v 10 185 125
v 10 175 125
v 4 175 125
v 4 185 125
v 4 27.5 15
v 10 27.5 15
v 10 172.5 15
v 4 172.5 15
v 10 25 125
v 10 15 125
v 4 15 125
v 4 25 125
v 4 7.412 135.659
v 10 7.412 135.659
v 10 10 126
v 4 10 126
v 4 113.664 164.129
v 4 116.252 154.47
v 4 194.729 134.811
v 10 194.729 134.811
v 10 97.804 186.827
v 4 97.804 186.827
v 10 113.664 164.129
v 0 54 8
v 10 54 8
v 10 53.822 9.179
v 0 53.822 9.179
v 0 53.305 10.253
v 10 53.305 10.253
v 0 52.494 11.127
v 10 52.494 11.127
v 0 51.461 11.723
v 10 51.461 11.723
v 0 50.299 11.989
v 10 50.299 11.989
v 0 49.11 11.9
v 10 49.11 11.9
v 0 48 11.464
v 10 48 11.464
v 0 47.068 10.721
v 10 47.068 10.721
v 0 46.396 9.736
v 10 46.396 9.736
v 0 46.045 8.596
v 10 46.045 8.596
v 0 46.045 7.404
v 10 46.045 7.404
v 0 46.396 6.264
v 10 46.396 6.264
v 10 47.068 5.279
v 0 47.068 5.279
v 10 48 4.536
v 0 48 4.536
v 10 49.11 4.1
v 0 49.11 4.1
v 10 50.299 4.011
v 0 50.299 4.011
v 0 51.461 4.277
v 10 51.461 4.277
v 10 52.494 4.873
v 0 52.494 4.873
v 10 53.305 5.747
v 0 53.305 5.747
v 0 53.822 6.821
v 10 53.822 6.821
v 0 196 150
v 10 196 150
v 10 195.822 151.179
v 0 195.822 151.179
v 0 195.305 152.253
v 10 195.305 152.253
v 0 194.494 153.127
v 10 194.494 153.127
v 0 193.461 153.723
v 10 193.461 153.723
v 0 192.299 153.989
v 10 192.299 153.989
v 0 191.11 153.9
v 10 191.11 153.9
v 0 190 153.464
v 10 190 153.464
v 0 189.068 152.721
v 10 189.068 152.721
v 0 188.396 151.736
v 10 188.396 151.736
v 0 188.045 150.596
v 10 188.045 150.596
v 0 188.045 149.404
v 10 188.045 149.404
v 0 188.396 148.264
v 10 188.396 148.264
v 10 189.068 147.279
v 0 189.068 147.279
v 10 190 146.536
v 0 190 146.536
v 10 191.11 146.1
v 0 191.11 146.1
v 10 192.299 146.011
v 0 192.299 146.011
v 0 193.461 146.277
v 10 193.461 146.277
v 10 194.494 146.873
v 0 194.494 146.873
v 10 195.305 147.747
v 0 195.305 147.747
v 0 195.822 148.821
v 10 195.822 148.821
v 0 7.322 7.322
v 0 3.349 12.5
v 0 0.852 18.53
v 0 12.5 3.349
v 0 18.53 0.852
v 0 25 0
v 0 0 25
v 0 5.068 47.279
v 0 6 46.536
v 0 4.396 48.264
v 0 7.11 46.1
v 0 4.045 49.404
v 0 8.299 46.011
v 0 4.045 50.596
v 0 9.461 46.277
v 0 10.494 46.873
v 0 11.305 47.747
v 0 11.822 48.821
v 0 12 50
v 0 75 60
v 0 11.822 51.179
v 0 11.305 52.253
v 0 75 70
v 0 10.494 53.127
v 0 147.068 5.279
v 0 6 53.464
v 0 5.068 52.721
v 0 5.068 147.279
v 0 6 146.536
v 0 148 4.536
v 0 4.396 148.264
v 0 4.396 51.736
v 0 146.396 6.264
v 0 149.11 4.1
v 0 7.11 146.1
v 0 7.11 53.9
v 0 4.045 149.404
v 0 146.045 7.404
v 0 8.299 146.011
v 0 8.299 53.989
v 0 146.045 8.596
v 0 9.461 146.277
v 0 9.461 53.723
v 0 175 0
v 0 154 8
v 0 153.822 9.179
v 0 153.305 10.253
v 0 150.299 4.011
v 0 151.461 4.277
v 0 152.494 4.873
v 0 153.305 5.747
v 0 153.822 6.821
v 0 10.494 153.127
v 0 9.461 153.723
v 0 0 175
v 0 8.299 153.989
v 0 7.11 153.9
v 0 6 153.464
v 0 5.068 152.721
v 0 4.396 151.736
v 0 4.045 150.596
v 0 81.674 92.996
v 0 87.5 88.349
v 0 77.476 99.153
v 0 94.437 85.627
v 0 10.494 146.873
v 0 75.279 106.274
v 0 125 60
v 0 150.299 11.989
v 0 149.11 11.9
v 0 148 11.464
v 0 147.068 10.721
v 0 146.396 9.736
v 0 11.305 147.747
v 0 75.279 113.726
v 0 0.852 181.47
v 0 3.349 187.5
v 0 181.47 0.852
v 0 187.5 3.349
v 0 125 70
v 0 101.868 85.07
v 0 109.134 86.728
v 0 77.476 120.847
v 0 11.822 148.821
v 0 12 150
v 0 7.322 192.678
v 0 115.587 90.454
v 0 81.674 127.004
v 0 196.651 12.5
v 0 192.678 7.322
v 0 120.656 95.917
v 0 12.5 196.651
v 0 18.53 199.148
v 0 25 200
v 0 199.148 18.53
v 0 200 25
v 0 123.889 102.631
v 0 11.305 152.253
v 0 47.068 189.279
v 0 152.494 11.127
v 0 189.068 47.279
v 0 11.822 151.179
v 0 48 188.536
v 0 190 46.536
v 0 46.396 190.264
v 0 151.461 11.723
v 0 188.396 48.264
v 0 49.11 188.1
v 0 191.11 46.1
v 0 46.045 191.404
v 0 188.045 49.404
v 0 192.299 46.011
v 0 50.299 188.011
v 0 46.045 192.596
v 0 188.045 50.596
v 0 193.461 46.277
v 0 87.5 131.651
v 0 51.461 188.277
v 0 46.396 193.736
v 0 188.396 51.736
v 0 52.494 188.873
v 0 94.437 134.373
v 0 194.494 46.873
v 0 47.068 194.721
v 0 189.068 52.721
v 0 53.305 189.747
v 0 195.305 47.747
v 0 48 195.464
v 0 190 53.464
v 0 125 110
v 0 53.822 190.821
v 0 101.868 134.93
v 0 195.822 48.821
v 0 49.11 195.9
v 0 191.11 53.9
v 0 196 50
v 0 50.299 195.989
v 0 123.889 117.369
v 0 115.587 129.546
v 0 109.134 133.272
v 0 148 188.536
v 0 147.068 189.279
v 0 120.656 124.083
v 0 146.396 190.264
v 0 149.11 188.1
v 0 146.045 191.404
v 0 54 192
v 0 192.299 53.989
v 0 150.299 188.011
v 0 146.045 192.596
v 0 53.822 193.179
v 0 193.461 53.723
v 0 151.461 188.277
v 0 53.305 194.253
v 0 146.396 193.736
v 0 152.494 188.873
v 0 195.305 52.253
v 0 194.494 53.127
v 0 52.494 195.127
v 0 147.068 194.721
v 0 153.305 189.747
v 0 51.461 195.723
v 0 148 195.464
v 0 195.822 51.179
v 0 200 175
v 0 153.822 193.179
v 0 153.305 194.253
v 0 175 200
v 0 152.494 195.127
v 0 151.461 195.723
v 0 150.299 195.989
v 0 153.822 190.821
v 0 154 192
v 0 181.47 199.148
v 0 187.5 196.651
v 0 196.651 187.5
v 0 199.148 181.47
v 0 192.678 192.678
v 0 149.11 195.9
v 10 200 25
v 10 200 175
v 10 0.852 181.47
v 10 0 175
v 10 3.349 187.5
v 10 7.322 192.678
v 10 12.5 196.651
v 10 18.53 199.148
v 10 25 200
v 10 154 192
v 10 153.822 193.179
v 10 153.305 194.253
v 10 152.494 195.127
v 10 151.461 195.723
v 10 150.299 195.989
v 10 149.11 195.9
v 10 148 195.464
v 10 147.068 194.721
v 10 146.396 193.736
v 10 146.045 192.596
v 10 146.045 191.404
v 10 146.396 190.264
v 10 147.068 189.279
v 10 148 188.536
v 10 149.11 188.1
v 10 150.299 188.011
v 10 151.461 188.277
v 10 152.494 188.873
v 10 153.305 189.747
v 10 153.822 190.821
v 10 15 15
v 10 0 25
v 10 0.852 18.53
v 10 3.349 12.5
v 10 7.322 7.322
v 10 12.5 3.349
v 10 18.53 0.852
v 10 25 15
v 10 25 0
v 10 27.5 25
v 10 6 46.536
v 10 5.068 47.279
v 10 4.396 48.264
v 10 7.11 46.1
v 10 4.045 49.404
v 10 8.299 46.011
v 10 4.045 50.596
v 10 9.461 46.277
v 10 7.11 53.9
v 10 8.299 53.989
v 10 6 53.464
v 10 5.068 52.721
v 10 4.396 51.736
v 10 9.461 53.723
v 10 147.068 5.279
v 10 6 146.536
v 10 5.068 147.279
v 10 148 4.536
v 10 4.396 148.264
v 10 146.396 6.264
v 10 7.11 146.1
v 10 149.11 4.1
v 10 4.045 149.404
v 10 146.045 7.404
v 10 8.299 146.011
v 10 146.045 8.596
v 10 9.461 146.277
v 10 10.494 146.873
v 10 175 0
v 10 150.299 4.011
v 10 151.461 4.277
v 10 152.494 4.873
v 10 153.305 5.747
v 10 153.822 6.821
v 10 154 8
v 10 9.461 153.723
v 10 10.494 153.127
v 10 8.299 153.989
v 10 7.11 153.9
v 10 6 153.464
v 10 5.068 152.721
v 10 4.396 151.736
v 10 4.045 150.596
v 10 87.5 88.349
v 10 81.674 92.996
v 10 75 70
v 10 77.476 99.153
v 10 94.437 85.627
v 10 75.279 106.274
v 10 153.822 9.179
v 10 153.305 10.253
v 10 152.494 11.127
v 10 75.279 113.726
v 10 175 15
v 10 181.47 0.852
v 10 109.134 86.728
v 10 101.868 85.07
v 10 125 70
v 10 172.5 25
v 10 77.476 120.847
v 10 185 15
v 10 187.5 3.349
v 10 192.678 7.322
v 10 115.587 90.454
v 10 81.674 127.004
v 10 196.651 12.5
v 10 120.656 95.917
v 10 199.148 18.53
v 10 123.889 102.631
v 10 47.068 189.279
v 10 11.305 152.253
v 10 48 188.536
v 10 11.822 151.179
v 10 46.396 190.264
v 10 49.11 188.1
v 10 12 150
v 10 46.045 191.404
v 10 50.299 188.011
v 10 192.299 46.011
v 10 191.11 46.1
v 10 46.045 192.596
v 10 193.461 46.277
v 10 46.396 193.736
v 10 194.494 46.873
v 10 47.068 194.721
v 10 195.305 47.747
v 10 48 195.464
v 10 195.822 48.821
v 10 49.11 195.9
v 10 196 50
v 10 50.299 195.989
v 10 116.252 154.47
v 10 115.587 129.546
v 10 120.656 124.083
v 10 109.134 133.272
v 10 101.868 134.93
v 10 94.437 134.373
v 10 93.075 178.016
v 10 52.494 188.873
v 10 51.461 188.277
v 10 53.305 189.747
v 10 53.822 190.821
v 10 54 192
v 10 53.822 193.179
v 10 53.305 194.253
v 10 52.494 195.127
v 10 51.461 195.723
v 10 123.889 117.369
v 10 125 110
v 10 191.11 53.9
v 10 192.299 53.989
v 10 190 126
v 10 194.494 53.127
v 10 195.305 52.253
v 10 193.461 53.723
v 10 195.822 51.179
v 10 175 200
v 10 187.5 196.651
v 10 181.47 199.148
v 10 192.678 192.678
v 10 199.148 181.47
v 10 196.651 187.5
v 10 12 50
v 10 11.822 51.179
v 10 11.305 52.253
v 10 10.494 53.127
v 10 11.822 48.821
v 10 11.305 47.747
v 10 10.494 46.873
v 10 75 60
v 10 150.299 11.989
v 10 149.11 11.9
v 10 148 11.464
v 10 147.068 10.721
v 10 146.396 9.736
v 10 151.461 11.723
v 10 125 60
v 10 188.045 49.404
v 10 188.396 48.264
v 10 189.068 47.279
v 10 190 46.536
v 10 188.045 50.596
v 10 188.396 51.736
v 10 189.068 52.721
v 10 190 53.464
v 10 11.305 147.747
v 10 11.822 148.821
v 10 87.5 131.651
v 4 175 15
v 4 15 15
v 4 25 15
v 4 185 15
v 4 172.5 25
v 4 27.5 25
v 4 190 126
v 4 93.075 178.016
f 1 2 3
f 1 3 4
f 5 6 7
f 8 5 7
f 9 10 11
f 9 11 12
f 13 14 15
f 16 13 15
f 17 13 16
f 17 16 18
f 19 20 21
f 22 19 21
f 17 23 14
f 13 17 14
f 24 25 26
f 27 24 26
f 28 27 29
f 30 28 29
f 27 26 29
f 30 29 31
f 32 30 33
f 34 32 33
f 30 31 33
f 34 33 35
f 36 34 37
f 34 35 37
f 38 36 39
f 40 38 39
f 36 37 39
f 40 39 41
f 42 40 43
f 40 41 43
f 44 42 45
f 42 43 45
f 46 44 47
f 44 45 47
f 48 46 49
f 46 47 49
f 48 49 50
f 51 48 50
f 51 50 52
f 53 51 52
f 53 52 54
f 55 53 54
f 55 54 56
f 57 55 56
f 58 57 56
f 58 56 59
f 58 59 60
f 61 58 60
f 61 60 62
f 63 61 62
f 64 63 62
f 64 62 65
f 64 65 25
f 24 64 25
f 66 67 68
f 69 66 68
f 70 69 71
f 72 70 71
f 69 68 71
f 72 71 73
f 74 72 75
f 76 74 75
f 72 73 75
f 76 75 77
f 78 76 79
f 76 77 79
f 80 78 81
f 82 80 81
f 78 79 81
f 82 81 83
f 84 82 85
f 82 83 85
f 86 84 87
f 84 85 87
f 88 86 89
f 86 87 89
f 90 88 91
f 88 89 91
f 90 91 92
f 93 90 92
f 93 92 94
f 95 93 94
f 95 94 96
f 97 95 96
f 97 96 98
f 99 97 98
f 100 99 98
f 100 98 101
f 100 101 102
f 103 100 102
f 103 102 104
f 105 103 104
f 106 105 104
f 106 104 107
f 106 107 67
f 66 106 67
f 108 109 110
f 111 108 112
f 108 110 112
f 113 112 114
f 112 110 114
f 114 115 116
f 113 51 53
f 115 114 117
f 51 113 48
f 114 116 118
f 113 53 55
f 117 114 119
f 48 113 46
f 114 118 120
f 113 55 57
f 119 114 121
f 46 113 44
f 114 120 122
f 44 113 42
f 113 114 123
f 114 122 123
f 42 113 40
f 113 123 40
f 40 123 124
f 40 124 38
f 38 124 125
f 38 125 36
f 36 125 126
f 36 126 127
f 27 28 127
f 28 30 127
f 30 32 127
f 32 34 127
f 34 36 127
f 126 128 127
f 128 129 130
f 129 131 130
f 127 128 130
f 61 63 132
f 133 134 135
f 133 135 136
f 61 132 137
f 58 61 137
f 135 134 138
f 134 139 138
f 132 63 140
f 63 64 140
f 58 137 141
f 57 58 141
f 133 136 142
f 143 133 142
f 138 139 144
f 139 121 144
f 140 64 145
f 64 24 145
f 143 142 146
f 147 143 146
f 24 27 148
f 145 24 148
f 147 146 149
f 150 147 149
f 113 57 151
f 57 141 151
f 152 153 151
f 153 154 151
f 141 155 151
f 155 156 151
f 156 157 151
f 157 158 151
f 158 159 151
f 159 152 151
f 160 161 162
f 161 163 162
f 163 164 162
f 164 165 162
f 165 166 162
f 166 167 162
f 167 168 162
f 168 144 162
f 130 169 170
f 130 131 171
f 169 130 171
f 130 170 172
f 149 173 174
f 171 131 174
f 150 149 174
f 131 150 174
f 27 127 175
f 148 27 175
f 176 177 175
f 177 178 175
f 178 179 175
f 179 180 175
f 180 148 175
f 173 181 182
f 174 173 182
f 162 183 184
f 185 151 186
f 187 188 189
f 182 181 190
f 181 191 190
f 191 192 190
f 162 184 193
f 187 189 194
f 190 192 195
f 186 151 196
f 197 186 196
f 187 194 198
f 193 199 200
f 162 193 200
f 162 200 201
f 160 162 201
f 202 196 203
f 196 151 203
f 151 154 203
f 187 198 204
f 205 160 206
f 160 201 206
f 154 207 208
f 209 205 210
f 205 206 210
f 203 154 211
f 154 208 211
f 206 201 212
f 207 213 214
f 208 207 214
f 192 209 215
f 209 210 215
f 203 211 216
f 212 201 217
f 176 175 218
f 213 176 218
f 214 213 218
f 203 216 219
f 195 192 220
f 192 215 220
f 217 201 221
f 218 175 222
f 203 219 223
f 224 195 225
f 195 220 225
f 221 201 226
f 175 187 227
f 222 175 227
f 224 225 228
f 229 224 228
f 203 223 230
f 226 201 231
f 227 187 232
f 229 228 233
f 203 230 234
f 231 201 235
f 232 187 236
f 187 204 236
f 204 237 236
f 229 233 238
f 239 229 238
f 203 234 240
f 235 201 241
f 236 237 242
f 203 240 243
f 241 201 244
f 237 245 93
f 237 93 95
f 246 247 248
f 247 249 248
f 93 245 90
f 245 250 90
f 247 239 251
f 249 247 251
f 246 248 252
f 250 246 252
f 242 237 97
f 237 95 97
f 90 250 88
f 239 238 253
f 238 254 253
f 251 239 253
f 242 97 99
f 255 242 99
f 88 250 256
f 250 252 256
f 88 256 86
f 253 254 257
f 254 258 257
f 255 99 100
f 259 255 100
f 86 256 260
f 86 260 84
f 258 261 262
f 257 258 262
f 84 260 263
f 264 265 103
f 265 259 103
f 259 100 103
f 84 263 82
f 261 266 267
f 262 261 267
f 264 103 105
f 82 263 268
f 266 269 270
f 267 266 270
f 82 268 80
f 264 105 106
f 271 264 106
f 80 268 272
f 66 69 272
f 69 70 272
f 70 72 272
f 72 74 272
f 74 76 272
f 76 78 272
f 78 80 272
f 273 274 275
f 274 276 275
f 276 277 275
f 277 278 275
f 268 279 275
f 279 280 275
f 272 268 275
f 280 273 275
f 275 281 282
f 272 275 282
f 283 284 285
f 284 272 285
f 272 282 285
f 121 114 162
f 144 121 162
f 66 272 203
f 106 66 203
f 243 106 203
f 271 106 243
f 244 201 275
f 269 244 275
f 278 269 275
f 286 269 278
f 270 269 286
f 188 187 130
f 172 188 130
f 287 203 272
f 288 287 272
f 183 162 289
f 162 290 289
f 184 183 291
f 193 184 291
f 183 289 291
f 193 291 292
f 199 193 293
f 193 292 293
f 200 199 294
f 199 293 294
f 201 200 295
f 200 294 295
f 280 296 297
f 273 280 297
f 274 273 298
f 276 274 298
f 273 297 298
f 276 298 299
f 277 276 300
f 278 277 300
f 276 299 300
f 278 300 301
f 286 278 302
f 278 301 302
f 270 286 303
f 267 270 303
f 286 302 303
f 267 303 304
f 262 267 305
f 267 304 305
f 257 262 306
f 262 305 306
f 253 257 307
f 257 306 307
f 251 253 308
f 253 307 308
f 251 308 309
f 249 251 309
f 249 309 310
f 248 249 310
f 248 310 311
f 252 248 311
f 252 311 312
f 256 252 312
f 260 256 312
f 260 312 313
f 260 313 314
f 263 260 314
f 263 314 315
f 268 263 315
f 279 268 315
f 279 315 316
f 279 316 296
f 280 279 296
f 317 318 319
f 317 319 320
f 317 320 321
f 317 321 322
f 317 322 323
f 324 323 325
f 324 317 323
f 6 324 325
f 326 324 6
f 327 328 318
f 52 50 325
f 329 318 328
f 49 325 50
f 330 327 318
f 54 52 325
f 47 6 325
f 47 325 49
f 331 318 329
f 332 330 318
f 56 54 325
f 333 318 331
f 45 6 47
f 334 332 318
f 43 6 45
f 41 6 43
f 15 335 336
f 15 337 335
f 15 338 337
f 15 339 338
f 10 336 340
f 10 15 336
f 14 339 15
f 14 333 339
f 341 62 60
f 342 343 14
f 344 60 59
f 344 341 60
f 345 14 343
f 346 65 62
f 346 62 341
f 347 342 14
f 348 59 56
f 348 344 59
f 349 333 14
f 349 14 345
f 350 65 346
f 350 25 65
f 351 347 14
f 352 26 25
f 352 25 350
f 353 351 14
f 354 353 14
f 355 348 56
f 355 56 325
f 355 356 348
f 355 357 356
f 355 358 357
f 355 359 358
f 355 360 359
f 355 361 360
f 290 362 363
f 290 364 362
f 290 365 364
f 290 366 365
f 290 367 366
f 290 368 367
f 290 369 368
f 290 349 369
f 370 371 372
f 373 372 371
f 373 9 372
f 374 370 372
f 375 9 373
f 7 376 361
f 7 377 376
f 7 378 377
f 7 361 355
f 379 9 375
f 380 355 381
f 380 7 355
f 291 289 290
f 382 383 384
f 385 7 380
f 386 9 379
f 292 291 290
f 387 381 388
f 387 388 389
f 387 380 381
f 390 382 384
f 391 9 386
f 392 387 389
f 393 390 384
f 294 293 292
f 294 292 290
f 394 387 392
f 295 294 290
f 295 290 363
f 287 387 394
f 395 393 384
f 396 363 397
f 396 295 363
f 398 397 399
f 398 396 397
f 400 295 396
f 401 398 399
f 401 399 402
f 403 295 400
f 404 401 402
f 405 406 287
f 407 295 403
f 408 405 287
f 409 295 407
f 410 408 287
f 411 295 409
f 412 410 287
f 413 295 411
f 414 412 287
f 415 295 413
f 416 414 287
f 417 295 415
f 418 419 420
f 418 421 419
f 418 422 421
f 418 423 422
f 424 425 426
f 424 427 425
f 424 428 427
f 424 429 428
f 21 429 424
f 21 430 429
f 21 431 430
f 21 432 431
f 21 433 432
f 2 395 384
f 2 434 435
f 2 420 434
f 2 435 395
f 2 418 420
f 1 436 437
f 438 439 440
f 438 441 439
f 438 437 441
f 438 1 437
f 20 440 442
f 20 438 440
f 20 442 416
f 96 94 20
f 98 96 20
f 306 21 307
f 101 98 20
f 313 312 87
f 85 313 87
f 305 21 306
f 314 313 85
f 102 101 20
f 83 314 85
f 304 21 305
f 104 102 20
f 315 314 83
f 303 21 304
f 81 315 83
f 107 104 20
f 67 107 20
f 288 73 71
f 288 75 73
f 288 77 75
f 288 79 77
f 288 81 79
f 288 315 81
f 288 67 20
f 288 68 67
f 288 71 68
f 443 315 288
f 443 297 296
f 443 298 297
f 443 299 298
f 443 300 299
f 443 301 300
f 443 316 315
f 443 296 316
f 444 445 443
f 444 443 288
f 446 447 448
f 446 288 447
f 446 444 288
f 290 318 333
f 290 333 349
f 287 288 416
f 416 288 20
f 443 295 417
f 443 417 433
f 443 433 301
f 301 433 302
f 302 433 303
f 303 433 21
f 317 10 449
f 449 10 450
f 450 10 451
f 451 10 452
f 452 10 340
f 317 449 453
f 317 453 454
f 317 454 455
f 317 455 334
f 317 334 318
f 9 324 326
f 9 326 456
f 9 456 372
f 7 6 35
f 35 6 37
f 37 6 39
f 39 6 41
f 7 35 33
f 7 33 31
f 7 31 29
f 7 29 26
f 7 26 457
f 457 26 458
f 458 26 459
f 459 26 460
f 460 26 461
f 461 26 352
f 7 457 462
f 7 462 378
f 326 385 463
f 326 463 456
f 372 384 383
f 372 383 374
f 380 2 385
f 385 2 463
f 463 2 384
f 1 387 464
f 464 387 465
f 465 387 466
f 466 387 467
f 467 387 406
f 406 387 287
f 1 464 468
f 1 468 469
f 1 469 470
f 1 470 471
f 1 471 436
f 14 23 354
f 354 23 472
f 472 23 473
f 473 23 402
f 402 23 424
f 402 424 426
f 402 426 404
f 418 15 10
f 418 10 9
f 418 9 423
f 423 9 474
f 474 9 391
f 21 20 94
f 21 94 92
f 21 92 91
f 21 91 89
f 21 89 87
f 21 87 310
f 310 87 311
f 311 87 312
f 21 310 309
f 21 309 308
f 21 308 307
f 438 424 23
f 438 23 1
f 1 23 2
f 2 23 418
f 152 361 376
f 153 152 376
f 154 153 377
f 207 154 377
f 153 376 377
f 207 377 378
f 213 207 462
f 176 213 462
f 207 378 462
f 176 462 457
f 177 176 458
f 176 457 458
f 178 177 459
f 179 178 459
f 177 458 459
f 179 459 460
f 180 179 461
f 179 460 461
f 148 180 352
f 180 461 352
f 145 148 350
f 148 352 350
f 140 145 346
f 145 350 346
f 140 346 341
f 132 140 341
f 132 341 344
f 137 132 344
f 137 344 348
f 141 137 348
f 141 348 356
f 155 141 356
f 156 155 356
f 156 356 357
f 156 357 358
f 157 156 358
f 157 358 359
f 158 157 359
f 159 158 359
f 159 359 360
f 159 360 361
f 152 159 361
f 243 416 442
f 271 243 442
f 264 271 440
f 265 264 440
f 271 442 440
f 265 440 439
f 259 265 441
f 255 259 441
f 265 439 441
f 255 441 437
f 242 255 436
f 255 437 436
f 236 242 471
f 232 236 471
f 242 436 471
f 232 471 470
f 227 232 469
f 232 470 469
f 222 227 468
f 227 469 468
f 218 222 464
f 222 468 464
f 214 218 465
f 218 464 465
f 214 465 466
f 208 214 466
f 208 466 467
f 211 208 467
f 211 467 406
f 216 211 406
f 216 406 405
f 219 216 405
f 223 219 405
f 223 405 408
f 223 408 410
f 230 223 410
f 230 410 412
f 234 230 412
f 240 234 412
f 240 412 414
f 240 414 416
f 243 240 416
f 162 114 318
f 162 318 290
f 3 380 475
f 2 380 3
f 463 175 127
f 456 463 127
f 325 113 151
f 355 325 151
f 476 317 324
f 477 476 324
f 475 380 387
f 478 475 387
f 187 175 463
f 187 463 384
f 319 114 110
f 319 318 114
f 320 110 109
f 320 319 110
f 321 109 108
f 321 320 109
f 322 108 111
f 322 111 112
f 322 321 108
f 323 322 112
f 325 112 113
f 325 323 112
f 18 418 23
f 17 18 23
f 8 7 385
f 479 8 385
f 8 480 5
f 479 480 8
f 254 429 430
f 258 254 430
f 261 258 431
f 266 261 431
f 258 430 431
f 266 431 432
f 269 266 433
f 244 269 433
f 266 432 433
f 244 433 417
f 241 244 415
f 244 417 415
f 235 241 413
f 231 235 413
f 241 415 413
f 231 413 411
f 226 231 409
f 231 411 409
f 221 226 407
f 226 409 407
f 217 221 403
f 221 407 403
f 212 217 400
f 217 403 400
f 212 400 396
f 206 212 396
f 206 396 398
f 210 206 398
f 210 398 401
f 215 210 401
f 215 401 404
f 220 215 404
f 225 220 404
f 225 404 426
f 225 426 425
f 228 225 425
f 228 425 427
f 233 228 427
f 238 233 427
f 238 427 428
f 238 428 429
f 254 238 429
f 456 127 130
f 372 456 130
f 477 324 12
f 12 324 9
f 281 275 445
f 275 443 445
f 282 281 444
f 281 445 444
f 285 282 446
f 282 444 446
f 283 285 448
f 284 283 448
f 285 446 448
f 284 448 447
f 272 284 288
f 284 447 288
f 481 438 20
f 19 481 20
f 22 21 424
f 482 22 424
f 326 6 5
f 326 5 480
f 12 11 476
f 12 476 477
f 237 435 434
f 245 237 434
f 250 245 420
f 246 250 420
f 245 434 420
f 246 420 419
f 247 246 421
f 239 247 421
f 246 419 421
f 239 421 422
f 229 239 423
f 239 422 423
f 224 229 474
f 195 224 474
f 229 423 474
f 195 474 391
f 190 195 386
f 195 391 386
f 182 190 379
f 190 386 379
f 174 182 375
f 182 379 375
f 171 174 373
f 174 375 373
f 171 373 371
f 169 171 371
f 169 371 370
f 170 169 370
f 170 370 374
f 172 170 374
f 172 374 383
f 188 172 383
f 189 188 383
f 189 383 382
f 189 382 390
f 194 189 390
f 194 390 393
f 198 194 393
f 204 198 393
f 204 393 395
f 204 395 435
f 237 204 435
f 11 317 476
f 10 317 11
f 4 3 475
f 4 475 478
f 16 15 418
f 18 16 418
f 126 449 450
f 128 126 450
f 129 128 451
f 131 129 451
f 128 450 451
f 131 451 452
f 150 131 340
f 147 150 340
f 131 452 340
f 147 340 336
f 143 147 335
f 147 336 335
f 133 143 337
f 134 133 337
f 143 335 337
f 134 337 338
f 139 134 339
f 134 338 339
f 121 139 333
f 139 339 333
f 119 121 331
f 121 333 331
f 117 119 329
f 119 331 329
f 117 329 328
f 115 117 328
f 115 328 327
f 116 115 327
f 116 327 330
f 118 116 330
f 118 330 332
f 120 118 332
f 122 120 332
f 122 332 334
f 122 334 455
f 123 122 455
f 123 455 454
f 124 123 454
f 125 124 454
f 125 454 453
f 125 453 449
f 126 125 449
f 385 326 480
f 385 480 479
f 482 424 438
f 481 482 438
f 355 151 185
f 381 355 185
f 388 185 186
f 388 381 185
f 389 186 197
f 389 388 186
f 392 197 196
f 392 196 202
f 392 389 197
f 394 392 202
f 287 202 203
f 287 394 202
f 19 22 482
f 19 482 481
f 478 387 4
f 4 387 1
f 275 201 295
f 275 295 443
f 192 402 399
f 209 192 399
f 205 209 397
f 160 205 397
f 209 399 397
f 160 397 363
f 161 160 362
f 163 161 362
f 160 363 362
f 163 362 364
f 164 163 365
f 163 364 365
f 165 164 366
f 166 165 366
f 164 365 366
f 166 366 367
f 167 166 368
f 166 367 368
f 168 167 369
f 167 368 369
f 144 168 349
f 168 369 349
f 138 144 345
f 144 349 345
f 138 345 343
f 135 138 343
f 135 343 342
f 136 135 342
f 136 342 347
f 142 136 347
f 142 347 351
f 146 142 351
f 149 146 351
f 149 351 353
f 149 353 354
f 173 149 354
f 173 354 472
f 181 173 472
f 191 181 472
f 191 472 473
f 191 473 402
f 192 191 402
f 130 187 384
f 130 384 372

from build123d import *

# Parameters (mm, degrees)
F0_W     = 200
F0_H     = 200
F1_DEPTH = 10
F2_W     = 10
F2_H     = 110
F2_W_2   = 145
F2_H_2   = 10
F3_DEPTH = 6
F6_D     = 50
F7_W     = 50
F7_H     = 10
F8_DEPTH = 10
F10_D    = 8
F11_R    = 25


with BuildPart() as f1:
    # F0 (on Right) → F1 (new body)
    with BuildSketch(Plane.YZ):
        with Locations((100, 100)):
            Rectangle(F0_W, F0_H)
    extrude(amount=F1_DEPTH)

    # F2 (on face) → F3 (cut)
    with BuildSketch(Plane.YZ.offset(10)):
        Polygon((113.66365, 164.129353), (7.41181, 135.659258), (10, 126), (116.251841, 154.470095), align=None)
        Polygon((97.804037, 186.82684), (93.075355, 178.015508), (190, 126), (194.728683, 134.811331), align=None)
        with Locations((20, 70)):
            Rectangle(F2_W, F2_H)
        with Locations((100, 20)):
            Rectangle(F2_W_2, F2_H_2)
        with Locations((180, 70)):
            Rectangle(F2_W, F2_H)
    extrude(amount=-F3_DEPTH, mode=Mode.SUBTRACT)

    # F6 (through all)
    with Locations(Plane(origin=(0, 0, 0), x_dir=(0, -1, 0), z_dir=(-1, 0, 0))):
        with Locations((-100, 110)):
            Hole(F6_D / 2)

    # F7 (on face) → F8 (cut, through all)
    with BuildSketch(Plane(origin=(0, 0, 0), x_dir=(0, -1, 0), z_dir=(-1, 0, 0))):
        with Locations((-100, 65)):
            Rectangle(F7_W, F7_H)
    extrude(amount=-F8_DEPTH, mode=Mode.SUBTRACT)

    # F10 (through all)
    with Locations(Plane(origin=(0, 0, 0), x_dir=(0, -1, 0), z_dir=(-1, 0, 0))):
        with Locations((-150, 192), (-192, 150), (-50, 192), (-8, 150), (-50, 8), (-8, 50), (-150, 8), (-192, 50)):
            Hole(F10_D / 2)

    # F11
    f11_edges = [f1.edges().sort_by_distance(p)[0] for p in [
        (5, 0, 200),
        (5, 0, 0),
        (5, 200, 200),
        (5, 200, 0),
    ]]
    fillet(f11_edges, radius=F11_R)


solid = f1.part
